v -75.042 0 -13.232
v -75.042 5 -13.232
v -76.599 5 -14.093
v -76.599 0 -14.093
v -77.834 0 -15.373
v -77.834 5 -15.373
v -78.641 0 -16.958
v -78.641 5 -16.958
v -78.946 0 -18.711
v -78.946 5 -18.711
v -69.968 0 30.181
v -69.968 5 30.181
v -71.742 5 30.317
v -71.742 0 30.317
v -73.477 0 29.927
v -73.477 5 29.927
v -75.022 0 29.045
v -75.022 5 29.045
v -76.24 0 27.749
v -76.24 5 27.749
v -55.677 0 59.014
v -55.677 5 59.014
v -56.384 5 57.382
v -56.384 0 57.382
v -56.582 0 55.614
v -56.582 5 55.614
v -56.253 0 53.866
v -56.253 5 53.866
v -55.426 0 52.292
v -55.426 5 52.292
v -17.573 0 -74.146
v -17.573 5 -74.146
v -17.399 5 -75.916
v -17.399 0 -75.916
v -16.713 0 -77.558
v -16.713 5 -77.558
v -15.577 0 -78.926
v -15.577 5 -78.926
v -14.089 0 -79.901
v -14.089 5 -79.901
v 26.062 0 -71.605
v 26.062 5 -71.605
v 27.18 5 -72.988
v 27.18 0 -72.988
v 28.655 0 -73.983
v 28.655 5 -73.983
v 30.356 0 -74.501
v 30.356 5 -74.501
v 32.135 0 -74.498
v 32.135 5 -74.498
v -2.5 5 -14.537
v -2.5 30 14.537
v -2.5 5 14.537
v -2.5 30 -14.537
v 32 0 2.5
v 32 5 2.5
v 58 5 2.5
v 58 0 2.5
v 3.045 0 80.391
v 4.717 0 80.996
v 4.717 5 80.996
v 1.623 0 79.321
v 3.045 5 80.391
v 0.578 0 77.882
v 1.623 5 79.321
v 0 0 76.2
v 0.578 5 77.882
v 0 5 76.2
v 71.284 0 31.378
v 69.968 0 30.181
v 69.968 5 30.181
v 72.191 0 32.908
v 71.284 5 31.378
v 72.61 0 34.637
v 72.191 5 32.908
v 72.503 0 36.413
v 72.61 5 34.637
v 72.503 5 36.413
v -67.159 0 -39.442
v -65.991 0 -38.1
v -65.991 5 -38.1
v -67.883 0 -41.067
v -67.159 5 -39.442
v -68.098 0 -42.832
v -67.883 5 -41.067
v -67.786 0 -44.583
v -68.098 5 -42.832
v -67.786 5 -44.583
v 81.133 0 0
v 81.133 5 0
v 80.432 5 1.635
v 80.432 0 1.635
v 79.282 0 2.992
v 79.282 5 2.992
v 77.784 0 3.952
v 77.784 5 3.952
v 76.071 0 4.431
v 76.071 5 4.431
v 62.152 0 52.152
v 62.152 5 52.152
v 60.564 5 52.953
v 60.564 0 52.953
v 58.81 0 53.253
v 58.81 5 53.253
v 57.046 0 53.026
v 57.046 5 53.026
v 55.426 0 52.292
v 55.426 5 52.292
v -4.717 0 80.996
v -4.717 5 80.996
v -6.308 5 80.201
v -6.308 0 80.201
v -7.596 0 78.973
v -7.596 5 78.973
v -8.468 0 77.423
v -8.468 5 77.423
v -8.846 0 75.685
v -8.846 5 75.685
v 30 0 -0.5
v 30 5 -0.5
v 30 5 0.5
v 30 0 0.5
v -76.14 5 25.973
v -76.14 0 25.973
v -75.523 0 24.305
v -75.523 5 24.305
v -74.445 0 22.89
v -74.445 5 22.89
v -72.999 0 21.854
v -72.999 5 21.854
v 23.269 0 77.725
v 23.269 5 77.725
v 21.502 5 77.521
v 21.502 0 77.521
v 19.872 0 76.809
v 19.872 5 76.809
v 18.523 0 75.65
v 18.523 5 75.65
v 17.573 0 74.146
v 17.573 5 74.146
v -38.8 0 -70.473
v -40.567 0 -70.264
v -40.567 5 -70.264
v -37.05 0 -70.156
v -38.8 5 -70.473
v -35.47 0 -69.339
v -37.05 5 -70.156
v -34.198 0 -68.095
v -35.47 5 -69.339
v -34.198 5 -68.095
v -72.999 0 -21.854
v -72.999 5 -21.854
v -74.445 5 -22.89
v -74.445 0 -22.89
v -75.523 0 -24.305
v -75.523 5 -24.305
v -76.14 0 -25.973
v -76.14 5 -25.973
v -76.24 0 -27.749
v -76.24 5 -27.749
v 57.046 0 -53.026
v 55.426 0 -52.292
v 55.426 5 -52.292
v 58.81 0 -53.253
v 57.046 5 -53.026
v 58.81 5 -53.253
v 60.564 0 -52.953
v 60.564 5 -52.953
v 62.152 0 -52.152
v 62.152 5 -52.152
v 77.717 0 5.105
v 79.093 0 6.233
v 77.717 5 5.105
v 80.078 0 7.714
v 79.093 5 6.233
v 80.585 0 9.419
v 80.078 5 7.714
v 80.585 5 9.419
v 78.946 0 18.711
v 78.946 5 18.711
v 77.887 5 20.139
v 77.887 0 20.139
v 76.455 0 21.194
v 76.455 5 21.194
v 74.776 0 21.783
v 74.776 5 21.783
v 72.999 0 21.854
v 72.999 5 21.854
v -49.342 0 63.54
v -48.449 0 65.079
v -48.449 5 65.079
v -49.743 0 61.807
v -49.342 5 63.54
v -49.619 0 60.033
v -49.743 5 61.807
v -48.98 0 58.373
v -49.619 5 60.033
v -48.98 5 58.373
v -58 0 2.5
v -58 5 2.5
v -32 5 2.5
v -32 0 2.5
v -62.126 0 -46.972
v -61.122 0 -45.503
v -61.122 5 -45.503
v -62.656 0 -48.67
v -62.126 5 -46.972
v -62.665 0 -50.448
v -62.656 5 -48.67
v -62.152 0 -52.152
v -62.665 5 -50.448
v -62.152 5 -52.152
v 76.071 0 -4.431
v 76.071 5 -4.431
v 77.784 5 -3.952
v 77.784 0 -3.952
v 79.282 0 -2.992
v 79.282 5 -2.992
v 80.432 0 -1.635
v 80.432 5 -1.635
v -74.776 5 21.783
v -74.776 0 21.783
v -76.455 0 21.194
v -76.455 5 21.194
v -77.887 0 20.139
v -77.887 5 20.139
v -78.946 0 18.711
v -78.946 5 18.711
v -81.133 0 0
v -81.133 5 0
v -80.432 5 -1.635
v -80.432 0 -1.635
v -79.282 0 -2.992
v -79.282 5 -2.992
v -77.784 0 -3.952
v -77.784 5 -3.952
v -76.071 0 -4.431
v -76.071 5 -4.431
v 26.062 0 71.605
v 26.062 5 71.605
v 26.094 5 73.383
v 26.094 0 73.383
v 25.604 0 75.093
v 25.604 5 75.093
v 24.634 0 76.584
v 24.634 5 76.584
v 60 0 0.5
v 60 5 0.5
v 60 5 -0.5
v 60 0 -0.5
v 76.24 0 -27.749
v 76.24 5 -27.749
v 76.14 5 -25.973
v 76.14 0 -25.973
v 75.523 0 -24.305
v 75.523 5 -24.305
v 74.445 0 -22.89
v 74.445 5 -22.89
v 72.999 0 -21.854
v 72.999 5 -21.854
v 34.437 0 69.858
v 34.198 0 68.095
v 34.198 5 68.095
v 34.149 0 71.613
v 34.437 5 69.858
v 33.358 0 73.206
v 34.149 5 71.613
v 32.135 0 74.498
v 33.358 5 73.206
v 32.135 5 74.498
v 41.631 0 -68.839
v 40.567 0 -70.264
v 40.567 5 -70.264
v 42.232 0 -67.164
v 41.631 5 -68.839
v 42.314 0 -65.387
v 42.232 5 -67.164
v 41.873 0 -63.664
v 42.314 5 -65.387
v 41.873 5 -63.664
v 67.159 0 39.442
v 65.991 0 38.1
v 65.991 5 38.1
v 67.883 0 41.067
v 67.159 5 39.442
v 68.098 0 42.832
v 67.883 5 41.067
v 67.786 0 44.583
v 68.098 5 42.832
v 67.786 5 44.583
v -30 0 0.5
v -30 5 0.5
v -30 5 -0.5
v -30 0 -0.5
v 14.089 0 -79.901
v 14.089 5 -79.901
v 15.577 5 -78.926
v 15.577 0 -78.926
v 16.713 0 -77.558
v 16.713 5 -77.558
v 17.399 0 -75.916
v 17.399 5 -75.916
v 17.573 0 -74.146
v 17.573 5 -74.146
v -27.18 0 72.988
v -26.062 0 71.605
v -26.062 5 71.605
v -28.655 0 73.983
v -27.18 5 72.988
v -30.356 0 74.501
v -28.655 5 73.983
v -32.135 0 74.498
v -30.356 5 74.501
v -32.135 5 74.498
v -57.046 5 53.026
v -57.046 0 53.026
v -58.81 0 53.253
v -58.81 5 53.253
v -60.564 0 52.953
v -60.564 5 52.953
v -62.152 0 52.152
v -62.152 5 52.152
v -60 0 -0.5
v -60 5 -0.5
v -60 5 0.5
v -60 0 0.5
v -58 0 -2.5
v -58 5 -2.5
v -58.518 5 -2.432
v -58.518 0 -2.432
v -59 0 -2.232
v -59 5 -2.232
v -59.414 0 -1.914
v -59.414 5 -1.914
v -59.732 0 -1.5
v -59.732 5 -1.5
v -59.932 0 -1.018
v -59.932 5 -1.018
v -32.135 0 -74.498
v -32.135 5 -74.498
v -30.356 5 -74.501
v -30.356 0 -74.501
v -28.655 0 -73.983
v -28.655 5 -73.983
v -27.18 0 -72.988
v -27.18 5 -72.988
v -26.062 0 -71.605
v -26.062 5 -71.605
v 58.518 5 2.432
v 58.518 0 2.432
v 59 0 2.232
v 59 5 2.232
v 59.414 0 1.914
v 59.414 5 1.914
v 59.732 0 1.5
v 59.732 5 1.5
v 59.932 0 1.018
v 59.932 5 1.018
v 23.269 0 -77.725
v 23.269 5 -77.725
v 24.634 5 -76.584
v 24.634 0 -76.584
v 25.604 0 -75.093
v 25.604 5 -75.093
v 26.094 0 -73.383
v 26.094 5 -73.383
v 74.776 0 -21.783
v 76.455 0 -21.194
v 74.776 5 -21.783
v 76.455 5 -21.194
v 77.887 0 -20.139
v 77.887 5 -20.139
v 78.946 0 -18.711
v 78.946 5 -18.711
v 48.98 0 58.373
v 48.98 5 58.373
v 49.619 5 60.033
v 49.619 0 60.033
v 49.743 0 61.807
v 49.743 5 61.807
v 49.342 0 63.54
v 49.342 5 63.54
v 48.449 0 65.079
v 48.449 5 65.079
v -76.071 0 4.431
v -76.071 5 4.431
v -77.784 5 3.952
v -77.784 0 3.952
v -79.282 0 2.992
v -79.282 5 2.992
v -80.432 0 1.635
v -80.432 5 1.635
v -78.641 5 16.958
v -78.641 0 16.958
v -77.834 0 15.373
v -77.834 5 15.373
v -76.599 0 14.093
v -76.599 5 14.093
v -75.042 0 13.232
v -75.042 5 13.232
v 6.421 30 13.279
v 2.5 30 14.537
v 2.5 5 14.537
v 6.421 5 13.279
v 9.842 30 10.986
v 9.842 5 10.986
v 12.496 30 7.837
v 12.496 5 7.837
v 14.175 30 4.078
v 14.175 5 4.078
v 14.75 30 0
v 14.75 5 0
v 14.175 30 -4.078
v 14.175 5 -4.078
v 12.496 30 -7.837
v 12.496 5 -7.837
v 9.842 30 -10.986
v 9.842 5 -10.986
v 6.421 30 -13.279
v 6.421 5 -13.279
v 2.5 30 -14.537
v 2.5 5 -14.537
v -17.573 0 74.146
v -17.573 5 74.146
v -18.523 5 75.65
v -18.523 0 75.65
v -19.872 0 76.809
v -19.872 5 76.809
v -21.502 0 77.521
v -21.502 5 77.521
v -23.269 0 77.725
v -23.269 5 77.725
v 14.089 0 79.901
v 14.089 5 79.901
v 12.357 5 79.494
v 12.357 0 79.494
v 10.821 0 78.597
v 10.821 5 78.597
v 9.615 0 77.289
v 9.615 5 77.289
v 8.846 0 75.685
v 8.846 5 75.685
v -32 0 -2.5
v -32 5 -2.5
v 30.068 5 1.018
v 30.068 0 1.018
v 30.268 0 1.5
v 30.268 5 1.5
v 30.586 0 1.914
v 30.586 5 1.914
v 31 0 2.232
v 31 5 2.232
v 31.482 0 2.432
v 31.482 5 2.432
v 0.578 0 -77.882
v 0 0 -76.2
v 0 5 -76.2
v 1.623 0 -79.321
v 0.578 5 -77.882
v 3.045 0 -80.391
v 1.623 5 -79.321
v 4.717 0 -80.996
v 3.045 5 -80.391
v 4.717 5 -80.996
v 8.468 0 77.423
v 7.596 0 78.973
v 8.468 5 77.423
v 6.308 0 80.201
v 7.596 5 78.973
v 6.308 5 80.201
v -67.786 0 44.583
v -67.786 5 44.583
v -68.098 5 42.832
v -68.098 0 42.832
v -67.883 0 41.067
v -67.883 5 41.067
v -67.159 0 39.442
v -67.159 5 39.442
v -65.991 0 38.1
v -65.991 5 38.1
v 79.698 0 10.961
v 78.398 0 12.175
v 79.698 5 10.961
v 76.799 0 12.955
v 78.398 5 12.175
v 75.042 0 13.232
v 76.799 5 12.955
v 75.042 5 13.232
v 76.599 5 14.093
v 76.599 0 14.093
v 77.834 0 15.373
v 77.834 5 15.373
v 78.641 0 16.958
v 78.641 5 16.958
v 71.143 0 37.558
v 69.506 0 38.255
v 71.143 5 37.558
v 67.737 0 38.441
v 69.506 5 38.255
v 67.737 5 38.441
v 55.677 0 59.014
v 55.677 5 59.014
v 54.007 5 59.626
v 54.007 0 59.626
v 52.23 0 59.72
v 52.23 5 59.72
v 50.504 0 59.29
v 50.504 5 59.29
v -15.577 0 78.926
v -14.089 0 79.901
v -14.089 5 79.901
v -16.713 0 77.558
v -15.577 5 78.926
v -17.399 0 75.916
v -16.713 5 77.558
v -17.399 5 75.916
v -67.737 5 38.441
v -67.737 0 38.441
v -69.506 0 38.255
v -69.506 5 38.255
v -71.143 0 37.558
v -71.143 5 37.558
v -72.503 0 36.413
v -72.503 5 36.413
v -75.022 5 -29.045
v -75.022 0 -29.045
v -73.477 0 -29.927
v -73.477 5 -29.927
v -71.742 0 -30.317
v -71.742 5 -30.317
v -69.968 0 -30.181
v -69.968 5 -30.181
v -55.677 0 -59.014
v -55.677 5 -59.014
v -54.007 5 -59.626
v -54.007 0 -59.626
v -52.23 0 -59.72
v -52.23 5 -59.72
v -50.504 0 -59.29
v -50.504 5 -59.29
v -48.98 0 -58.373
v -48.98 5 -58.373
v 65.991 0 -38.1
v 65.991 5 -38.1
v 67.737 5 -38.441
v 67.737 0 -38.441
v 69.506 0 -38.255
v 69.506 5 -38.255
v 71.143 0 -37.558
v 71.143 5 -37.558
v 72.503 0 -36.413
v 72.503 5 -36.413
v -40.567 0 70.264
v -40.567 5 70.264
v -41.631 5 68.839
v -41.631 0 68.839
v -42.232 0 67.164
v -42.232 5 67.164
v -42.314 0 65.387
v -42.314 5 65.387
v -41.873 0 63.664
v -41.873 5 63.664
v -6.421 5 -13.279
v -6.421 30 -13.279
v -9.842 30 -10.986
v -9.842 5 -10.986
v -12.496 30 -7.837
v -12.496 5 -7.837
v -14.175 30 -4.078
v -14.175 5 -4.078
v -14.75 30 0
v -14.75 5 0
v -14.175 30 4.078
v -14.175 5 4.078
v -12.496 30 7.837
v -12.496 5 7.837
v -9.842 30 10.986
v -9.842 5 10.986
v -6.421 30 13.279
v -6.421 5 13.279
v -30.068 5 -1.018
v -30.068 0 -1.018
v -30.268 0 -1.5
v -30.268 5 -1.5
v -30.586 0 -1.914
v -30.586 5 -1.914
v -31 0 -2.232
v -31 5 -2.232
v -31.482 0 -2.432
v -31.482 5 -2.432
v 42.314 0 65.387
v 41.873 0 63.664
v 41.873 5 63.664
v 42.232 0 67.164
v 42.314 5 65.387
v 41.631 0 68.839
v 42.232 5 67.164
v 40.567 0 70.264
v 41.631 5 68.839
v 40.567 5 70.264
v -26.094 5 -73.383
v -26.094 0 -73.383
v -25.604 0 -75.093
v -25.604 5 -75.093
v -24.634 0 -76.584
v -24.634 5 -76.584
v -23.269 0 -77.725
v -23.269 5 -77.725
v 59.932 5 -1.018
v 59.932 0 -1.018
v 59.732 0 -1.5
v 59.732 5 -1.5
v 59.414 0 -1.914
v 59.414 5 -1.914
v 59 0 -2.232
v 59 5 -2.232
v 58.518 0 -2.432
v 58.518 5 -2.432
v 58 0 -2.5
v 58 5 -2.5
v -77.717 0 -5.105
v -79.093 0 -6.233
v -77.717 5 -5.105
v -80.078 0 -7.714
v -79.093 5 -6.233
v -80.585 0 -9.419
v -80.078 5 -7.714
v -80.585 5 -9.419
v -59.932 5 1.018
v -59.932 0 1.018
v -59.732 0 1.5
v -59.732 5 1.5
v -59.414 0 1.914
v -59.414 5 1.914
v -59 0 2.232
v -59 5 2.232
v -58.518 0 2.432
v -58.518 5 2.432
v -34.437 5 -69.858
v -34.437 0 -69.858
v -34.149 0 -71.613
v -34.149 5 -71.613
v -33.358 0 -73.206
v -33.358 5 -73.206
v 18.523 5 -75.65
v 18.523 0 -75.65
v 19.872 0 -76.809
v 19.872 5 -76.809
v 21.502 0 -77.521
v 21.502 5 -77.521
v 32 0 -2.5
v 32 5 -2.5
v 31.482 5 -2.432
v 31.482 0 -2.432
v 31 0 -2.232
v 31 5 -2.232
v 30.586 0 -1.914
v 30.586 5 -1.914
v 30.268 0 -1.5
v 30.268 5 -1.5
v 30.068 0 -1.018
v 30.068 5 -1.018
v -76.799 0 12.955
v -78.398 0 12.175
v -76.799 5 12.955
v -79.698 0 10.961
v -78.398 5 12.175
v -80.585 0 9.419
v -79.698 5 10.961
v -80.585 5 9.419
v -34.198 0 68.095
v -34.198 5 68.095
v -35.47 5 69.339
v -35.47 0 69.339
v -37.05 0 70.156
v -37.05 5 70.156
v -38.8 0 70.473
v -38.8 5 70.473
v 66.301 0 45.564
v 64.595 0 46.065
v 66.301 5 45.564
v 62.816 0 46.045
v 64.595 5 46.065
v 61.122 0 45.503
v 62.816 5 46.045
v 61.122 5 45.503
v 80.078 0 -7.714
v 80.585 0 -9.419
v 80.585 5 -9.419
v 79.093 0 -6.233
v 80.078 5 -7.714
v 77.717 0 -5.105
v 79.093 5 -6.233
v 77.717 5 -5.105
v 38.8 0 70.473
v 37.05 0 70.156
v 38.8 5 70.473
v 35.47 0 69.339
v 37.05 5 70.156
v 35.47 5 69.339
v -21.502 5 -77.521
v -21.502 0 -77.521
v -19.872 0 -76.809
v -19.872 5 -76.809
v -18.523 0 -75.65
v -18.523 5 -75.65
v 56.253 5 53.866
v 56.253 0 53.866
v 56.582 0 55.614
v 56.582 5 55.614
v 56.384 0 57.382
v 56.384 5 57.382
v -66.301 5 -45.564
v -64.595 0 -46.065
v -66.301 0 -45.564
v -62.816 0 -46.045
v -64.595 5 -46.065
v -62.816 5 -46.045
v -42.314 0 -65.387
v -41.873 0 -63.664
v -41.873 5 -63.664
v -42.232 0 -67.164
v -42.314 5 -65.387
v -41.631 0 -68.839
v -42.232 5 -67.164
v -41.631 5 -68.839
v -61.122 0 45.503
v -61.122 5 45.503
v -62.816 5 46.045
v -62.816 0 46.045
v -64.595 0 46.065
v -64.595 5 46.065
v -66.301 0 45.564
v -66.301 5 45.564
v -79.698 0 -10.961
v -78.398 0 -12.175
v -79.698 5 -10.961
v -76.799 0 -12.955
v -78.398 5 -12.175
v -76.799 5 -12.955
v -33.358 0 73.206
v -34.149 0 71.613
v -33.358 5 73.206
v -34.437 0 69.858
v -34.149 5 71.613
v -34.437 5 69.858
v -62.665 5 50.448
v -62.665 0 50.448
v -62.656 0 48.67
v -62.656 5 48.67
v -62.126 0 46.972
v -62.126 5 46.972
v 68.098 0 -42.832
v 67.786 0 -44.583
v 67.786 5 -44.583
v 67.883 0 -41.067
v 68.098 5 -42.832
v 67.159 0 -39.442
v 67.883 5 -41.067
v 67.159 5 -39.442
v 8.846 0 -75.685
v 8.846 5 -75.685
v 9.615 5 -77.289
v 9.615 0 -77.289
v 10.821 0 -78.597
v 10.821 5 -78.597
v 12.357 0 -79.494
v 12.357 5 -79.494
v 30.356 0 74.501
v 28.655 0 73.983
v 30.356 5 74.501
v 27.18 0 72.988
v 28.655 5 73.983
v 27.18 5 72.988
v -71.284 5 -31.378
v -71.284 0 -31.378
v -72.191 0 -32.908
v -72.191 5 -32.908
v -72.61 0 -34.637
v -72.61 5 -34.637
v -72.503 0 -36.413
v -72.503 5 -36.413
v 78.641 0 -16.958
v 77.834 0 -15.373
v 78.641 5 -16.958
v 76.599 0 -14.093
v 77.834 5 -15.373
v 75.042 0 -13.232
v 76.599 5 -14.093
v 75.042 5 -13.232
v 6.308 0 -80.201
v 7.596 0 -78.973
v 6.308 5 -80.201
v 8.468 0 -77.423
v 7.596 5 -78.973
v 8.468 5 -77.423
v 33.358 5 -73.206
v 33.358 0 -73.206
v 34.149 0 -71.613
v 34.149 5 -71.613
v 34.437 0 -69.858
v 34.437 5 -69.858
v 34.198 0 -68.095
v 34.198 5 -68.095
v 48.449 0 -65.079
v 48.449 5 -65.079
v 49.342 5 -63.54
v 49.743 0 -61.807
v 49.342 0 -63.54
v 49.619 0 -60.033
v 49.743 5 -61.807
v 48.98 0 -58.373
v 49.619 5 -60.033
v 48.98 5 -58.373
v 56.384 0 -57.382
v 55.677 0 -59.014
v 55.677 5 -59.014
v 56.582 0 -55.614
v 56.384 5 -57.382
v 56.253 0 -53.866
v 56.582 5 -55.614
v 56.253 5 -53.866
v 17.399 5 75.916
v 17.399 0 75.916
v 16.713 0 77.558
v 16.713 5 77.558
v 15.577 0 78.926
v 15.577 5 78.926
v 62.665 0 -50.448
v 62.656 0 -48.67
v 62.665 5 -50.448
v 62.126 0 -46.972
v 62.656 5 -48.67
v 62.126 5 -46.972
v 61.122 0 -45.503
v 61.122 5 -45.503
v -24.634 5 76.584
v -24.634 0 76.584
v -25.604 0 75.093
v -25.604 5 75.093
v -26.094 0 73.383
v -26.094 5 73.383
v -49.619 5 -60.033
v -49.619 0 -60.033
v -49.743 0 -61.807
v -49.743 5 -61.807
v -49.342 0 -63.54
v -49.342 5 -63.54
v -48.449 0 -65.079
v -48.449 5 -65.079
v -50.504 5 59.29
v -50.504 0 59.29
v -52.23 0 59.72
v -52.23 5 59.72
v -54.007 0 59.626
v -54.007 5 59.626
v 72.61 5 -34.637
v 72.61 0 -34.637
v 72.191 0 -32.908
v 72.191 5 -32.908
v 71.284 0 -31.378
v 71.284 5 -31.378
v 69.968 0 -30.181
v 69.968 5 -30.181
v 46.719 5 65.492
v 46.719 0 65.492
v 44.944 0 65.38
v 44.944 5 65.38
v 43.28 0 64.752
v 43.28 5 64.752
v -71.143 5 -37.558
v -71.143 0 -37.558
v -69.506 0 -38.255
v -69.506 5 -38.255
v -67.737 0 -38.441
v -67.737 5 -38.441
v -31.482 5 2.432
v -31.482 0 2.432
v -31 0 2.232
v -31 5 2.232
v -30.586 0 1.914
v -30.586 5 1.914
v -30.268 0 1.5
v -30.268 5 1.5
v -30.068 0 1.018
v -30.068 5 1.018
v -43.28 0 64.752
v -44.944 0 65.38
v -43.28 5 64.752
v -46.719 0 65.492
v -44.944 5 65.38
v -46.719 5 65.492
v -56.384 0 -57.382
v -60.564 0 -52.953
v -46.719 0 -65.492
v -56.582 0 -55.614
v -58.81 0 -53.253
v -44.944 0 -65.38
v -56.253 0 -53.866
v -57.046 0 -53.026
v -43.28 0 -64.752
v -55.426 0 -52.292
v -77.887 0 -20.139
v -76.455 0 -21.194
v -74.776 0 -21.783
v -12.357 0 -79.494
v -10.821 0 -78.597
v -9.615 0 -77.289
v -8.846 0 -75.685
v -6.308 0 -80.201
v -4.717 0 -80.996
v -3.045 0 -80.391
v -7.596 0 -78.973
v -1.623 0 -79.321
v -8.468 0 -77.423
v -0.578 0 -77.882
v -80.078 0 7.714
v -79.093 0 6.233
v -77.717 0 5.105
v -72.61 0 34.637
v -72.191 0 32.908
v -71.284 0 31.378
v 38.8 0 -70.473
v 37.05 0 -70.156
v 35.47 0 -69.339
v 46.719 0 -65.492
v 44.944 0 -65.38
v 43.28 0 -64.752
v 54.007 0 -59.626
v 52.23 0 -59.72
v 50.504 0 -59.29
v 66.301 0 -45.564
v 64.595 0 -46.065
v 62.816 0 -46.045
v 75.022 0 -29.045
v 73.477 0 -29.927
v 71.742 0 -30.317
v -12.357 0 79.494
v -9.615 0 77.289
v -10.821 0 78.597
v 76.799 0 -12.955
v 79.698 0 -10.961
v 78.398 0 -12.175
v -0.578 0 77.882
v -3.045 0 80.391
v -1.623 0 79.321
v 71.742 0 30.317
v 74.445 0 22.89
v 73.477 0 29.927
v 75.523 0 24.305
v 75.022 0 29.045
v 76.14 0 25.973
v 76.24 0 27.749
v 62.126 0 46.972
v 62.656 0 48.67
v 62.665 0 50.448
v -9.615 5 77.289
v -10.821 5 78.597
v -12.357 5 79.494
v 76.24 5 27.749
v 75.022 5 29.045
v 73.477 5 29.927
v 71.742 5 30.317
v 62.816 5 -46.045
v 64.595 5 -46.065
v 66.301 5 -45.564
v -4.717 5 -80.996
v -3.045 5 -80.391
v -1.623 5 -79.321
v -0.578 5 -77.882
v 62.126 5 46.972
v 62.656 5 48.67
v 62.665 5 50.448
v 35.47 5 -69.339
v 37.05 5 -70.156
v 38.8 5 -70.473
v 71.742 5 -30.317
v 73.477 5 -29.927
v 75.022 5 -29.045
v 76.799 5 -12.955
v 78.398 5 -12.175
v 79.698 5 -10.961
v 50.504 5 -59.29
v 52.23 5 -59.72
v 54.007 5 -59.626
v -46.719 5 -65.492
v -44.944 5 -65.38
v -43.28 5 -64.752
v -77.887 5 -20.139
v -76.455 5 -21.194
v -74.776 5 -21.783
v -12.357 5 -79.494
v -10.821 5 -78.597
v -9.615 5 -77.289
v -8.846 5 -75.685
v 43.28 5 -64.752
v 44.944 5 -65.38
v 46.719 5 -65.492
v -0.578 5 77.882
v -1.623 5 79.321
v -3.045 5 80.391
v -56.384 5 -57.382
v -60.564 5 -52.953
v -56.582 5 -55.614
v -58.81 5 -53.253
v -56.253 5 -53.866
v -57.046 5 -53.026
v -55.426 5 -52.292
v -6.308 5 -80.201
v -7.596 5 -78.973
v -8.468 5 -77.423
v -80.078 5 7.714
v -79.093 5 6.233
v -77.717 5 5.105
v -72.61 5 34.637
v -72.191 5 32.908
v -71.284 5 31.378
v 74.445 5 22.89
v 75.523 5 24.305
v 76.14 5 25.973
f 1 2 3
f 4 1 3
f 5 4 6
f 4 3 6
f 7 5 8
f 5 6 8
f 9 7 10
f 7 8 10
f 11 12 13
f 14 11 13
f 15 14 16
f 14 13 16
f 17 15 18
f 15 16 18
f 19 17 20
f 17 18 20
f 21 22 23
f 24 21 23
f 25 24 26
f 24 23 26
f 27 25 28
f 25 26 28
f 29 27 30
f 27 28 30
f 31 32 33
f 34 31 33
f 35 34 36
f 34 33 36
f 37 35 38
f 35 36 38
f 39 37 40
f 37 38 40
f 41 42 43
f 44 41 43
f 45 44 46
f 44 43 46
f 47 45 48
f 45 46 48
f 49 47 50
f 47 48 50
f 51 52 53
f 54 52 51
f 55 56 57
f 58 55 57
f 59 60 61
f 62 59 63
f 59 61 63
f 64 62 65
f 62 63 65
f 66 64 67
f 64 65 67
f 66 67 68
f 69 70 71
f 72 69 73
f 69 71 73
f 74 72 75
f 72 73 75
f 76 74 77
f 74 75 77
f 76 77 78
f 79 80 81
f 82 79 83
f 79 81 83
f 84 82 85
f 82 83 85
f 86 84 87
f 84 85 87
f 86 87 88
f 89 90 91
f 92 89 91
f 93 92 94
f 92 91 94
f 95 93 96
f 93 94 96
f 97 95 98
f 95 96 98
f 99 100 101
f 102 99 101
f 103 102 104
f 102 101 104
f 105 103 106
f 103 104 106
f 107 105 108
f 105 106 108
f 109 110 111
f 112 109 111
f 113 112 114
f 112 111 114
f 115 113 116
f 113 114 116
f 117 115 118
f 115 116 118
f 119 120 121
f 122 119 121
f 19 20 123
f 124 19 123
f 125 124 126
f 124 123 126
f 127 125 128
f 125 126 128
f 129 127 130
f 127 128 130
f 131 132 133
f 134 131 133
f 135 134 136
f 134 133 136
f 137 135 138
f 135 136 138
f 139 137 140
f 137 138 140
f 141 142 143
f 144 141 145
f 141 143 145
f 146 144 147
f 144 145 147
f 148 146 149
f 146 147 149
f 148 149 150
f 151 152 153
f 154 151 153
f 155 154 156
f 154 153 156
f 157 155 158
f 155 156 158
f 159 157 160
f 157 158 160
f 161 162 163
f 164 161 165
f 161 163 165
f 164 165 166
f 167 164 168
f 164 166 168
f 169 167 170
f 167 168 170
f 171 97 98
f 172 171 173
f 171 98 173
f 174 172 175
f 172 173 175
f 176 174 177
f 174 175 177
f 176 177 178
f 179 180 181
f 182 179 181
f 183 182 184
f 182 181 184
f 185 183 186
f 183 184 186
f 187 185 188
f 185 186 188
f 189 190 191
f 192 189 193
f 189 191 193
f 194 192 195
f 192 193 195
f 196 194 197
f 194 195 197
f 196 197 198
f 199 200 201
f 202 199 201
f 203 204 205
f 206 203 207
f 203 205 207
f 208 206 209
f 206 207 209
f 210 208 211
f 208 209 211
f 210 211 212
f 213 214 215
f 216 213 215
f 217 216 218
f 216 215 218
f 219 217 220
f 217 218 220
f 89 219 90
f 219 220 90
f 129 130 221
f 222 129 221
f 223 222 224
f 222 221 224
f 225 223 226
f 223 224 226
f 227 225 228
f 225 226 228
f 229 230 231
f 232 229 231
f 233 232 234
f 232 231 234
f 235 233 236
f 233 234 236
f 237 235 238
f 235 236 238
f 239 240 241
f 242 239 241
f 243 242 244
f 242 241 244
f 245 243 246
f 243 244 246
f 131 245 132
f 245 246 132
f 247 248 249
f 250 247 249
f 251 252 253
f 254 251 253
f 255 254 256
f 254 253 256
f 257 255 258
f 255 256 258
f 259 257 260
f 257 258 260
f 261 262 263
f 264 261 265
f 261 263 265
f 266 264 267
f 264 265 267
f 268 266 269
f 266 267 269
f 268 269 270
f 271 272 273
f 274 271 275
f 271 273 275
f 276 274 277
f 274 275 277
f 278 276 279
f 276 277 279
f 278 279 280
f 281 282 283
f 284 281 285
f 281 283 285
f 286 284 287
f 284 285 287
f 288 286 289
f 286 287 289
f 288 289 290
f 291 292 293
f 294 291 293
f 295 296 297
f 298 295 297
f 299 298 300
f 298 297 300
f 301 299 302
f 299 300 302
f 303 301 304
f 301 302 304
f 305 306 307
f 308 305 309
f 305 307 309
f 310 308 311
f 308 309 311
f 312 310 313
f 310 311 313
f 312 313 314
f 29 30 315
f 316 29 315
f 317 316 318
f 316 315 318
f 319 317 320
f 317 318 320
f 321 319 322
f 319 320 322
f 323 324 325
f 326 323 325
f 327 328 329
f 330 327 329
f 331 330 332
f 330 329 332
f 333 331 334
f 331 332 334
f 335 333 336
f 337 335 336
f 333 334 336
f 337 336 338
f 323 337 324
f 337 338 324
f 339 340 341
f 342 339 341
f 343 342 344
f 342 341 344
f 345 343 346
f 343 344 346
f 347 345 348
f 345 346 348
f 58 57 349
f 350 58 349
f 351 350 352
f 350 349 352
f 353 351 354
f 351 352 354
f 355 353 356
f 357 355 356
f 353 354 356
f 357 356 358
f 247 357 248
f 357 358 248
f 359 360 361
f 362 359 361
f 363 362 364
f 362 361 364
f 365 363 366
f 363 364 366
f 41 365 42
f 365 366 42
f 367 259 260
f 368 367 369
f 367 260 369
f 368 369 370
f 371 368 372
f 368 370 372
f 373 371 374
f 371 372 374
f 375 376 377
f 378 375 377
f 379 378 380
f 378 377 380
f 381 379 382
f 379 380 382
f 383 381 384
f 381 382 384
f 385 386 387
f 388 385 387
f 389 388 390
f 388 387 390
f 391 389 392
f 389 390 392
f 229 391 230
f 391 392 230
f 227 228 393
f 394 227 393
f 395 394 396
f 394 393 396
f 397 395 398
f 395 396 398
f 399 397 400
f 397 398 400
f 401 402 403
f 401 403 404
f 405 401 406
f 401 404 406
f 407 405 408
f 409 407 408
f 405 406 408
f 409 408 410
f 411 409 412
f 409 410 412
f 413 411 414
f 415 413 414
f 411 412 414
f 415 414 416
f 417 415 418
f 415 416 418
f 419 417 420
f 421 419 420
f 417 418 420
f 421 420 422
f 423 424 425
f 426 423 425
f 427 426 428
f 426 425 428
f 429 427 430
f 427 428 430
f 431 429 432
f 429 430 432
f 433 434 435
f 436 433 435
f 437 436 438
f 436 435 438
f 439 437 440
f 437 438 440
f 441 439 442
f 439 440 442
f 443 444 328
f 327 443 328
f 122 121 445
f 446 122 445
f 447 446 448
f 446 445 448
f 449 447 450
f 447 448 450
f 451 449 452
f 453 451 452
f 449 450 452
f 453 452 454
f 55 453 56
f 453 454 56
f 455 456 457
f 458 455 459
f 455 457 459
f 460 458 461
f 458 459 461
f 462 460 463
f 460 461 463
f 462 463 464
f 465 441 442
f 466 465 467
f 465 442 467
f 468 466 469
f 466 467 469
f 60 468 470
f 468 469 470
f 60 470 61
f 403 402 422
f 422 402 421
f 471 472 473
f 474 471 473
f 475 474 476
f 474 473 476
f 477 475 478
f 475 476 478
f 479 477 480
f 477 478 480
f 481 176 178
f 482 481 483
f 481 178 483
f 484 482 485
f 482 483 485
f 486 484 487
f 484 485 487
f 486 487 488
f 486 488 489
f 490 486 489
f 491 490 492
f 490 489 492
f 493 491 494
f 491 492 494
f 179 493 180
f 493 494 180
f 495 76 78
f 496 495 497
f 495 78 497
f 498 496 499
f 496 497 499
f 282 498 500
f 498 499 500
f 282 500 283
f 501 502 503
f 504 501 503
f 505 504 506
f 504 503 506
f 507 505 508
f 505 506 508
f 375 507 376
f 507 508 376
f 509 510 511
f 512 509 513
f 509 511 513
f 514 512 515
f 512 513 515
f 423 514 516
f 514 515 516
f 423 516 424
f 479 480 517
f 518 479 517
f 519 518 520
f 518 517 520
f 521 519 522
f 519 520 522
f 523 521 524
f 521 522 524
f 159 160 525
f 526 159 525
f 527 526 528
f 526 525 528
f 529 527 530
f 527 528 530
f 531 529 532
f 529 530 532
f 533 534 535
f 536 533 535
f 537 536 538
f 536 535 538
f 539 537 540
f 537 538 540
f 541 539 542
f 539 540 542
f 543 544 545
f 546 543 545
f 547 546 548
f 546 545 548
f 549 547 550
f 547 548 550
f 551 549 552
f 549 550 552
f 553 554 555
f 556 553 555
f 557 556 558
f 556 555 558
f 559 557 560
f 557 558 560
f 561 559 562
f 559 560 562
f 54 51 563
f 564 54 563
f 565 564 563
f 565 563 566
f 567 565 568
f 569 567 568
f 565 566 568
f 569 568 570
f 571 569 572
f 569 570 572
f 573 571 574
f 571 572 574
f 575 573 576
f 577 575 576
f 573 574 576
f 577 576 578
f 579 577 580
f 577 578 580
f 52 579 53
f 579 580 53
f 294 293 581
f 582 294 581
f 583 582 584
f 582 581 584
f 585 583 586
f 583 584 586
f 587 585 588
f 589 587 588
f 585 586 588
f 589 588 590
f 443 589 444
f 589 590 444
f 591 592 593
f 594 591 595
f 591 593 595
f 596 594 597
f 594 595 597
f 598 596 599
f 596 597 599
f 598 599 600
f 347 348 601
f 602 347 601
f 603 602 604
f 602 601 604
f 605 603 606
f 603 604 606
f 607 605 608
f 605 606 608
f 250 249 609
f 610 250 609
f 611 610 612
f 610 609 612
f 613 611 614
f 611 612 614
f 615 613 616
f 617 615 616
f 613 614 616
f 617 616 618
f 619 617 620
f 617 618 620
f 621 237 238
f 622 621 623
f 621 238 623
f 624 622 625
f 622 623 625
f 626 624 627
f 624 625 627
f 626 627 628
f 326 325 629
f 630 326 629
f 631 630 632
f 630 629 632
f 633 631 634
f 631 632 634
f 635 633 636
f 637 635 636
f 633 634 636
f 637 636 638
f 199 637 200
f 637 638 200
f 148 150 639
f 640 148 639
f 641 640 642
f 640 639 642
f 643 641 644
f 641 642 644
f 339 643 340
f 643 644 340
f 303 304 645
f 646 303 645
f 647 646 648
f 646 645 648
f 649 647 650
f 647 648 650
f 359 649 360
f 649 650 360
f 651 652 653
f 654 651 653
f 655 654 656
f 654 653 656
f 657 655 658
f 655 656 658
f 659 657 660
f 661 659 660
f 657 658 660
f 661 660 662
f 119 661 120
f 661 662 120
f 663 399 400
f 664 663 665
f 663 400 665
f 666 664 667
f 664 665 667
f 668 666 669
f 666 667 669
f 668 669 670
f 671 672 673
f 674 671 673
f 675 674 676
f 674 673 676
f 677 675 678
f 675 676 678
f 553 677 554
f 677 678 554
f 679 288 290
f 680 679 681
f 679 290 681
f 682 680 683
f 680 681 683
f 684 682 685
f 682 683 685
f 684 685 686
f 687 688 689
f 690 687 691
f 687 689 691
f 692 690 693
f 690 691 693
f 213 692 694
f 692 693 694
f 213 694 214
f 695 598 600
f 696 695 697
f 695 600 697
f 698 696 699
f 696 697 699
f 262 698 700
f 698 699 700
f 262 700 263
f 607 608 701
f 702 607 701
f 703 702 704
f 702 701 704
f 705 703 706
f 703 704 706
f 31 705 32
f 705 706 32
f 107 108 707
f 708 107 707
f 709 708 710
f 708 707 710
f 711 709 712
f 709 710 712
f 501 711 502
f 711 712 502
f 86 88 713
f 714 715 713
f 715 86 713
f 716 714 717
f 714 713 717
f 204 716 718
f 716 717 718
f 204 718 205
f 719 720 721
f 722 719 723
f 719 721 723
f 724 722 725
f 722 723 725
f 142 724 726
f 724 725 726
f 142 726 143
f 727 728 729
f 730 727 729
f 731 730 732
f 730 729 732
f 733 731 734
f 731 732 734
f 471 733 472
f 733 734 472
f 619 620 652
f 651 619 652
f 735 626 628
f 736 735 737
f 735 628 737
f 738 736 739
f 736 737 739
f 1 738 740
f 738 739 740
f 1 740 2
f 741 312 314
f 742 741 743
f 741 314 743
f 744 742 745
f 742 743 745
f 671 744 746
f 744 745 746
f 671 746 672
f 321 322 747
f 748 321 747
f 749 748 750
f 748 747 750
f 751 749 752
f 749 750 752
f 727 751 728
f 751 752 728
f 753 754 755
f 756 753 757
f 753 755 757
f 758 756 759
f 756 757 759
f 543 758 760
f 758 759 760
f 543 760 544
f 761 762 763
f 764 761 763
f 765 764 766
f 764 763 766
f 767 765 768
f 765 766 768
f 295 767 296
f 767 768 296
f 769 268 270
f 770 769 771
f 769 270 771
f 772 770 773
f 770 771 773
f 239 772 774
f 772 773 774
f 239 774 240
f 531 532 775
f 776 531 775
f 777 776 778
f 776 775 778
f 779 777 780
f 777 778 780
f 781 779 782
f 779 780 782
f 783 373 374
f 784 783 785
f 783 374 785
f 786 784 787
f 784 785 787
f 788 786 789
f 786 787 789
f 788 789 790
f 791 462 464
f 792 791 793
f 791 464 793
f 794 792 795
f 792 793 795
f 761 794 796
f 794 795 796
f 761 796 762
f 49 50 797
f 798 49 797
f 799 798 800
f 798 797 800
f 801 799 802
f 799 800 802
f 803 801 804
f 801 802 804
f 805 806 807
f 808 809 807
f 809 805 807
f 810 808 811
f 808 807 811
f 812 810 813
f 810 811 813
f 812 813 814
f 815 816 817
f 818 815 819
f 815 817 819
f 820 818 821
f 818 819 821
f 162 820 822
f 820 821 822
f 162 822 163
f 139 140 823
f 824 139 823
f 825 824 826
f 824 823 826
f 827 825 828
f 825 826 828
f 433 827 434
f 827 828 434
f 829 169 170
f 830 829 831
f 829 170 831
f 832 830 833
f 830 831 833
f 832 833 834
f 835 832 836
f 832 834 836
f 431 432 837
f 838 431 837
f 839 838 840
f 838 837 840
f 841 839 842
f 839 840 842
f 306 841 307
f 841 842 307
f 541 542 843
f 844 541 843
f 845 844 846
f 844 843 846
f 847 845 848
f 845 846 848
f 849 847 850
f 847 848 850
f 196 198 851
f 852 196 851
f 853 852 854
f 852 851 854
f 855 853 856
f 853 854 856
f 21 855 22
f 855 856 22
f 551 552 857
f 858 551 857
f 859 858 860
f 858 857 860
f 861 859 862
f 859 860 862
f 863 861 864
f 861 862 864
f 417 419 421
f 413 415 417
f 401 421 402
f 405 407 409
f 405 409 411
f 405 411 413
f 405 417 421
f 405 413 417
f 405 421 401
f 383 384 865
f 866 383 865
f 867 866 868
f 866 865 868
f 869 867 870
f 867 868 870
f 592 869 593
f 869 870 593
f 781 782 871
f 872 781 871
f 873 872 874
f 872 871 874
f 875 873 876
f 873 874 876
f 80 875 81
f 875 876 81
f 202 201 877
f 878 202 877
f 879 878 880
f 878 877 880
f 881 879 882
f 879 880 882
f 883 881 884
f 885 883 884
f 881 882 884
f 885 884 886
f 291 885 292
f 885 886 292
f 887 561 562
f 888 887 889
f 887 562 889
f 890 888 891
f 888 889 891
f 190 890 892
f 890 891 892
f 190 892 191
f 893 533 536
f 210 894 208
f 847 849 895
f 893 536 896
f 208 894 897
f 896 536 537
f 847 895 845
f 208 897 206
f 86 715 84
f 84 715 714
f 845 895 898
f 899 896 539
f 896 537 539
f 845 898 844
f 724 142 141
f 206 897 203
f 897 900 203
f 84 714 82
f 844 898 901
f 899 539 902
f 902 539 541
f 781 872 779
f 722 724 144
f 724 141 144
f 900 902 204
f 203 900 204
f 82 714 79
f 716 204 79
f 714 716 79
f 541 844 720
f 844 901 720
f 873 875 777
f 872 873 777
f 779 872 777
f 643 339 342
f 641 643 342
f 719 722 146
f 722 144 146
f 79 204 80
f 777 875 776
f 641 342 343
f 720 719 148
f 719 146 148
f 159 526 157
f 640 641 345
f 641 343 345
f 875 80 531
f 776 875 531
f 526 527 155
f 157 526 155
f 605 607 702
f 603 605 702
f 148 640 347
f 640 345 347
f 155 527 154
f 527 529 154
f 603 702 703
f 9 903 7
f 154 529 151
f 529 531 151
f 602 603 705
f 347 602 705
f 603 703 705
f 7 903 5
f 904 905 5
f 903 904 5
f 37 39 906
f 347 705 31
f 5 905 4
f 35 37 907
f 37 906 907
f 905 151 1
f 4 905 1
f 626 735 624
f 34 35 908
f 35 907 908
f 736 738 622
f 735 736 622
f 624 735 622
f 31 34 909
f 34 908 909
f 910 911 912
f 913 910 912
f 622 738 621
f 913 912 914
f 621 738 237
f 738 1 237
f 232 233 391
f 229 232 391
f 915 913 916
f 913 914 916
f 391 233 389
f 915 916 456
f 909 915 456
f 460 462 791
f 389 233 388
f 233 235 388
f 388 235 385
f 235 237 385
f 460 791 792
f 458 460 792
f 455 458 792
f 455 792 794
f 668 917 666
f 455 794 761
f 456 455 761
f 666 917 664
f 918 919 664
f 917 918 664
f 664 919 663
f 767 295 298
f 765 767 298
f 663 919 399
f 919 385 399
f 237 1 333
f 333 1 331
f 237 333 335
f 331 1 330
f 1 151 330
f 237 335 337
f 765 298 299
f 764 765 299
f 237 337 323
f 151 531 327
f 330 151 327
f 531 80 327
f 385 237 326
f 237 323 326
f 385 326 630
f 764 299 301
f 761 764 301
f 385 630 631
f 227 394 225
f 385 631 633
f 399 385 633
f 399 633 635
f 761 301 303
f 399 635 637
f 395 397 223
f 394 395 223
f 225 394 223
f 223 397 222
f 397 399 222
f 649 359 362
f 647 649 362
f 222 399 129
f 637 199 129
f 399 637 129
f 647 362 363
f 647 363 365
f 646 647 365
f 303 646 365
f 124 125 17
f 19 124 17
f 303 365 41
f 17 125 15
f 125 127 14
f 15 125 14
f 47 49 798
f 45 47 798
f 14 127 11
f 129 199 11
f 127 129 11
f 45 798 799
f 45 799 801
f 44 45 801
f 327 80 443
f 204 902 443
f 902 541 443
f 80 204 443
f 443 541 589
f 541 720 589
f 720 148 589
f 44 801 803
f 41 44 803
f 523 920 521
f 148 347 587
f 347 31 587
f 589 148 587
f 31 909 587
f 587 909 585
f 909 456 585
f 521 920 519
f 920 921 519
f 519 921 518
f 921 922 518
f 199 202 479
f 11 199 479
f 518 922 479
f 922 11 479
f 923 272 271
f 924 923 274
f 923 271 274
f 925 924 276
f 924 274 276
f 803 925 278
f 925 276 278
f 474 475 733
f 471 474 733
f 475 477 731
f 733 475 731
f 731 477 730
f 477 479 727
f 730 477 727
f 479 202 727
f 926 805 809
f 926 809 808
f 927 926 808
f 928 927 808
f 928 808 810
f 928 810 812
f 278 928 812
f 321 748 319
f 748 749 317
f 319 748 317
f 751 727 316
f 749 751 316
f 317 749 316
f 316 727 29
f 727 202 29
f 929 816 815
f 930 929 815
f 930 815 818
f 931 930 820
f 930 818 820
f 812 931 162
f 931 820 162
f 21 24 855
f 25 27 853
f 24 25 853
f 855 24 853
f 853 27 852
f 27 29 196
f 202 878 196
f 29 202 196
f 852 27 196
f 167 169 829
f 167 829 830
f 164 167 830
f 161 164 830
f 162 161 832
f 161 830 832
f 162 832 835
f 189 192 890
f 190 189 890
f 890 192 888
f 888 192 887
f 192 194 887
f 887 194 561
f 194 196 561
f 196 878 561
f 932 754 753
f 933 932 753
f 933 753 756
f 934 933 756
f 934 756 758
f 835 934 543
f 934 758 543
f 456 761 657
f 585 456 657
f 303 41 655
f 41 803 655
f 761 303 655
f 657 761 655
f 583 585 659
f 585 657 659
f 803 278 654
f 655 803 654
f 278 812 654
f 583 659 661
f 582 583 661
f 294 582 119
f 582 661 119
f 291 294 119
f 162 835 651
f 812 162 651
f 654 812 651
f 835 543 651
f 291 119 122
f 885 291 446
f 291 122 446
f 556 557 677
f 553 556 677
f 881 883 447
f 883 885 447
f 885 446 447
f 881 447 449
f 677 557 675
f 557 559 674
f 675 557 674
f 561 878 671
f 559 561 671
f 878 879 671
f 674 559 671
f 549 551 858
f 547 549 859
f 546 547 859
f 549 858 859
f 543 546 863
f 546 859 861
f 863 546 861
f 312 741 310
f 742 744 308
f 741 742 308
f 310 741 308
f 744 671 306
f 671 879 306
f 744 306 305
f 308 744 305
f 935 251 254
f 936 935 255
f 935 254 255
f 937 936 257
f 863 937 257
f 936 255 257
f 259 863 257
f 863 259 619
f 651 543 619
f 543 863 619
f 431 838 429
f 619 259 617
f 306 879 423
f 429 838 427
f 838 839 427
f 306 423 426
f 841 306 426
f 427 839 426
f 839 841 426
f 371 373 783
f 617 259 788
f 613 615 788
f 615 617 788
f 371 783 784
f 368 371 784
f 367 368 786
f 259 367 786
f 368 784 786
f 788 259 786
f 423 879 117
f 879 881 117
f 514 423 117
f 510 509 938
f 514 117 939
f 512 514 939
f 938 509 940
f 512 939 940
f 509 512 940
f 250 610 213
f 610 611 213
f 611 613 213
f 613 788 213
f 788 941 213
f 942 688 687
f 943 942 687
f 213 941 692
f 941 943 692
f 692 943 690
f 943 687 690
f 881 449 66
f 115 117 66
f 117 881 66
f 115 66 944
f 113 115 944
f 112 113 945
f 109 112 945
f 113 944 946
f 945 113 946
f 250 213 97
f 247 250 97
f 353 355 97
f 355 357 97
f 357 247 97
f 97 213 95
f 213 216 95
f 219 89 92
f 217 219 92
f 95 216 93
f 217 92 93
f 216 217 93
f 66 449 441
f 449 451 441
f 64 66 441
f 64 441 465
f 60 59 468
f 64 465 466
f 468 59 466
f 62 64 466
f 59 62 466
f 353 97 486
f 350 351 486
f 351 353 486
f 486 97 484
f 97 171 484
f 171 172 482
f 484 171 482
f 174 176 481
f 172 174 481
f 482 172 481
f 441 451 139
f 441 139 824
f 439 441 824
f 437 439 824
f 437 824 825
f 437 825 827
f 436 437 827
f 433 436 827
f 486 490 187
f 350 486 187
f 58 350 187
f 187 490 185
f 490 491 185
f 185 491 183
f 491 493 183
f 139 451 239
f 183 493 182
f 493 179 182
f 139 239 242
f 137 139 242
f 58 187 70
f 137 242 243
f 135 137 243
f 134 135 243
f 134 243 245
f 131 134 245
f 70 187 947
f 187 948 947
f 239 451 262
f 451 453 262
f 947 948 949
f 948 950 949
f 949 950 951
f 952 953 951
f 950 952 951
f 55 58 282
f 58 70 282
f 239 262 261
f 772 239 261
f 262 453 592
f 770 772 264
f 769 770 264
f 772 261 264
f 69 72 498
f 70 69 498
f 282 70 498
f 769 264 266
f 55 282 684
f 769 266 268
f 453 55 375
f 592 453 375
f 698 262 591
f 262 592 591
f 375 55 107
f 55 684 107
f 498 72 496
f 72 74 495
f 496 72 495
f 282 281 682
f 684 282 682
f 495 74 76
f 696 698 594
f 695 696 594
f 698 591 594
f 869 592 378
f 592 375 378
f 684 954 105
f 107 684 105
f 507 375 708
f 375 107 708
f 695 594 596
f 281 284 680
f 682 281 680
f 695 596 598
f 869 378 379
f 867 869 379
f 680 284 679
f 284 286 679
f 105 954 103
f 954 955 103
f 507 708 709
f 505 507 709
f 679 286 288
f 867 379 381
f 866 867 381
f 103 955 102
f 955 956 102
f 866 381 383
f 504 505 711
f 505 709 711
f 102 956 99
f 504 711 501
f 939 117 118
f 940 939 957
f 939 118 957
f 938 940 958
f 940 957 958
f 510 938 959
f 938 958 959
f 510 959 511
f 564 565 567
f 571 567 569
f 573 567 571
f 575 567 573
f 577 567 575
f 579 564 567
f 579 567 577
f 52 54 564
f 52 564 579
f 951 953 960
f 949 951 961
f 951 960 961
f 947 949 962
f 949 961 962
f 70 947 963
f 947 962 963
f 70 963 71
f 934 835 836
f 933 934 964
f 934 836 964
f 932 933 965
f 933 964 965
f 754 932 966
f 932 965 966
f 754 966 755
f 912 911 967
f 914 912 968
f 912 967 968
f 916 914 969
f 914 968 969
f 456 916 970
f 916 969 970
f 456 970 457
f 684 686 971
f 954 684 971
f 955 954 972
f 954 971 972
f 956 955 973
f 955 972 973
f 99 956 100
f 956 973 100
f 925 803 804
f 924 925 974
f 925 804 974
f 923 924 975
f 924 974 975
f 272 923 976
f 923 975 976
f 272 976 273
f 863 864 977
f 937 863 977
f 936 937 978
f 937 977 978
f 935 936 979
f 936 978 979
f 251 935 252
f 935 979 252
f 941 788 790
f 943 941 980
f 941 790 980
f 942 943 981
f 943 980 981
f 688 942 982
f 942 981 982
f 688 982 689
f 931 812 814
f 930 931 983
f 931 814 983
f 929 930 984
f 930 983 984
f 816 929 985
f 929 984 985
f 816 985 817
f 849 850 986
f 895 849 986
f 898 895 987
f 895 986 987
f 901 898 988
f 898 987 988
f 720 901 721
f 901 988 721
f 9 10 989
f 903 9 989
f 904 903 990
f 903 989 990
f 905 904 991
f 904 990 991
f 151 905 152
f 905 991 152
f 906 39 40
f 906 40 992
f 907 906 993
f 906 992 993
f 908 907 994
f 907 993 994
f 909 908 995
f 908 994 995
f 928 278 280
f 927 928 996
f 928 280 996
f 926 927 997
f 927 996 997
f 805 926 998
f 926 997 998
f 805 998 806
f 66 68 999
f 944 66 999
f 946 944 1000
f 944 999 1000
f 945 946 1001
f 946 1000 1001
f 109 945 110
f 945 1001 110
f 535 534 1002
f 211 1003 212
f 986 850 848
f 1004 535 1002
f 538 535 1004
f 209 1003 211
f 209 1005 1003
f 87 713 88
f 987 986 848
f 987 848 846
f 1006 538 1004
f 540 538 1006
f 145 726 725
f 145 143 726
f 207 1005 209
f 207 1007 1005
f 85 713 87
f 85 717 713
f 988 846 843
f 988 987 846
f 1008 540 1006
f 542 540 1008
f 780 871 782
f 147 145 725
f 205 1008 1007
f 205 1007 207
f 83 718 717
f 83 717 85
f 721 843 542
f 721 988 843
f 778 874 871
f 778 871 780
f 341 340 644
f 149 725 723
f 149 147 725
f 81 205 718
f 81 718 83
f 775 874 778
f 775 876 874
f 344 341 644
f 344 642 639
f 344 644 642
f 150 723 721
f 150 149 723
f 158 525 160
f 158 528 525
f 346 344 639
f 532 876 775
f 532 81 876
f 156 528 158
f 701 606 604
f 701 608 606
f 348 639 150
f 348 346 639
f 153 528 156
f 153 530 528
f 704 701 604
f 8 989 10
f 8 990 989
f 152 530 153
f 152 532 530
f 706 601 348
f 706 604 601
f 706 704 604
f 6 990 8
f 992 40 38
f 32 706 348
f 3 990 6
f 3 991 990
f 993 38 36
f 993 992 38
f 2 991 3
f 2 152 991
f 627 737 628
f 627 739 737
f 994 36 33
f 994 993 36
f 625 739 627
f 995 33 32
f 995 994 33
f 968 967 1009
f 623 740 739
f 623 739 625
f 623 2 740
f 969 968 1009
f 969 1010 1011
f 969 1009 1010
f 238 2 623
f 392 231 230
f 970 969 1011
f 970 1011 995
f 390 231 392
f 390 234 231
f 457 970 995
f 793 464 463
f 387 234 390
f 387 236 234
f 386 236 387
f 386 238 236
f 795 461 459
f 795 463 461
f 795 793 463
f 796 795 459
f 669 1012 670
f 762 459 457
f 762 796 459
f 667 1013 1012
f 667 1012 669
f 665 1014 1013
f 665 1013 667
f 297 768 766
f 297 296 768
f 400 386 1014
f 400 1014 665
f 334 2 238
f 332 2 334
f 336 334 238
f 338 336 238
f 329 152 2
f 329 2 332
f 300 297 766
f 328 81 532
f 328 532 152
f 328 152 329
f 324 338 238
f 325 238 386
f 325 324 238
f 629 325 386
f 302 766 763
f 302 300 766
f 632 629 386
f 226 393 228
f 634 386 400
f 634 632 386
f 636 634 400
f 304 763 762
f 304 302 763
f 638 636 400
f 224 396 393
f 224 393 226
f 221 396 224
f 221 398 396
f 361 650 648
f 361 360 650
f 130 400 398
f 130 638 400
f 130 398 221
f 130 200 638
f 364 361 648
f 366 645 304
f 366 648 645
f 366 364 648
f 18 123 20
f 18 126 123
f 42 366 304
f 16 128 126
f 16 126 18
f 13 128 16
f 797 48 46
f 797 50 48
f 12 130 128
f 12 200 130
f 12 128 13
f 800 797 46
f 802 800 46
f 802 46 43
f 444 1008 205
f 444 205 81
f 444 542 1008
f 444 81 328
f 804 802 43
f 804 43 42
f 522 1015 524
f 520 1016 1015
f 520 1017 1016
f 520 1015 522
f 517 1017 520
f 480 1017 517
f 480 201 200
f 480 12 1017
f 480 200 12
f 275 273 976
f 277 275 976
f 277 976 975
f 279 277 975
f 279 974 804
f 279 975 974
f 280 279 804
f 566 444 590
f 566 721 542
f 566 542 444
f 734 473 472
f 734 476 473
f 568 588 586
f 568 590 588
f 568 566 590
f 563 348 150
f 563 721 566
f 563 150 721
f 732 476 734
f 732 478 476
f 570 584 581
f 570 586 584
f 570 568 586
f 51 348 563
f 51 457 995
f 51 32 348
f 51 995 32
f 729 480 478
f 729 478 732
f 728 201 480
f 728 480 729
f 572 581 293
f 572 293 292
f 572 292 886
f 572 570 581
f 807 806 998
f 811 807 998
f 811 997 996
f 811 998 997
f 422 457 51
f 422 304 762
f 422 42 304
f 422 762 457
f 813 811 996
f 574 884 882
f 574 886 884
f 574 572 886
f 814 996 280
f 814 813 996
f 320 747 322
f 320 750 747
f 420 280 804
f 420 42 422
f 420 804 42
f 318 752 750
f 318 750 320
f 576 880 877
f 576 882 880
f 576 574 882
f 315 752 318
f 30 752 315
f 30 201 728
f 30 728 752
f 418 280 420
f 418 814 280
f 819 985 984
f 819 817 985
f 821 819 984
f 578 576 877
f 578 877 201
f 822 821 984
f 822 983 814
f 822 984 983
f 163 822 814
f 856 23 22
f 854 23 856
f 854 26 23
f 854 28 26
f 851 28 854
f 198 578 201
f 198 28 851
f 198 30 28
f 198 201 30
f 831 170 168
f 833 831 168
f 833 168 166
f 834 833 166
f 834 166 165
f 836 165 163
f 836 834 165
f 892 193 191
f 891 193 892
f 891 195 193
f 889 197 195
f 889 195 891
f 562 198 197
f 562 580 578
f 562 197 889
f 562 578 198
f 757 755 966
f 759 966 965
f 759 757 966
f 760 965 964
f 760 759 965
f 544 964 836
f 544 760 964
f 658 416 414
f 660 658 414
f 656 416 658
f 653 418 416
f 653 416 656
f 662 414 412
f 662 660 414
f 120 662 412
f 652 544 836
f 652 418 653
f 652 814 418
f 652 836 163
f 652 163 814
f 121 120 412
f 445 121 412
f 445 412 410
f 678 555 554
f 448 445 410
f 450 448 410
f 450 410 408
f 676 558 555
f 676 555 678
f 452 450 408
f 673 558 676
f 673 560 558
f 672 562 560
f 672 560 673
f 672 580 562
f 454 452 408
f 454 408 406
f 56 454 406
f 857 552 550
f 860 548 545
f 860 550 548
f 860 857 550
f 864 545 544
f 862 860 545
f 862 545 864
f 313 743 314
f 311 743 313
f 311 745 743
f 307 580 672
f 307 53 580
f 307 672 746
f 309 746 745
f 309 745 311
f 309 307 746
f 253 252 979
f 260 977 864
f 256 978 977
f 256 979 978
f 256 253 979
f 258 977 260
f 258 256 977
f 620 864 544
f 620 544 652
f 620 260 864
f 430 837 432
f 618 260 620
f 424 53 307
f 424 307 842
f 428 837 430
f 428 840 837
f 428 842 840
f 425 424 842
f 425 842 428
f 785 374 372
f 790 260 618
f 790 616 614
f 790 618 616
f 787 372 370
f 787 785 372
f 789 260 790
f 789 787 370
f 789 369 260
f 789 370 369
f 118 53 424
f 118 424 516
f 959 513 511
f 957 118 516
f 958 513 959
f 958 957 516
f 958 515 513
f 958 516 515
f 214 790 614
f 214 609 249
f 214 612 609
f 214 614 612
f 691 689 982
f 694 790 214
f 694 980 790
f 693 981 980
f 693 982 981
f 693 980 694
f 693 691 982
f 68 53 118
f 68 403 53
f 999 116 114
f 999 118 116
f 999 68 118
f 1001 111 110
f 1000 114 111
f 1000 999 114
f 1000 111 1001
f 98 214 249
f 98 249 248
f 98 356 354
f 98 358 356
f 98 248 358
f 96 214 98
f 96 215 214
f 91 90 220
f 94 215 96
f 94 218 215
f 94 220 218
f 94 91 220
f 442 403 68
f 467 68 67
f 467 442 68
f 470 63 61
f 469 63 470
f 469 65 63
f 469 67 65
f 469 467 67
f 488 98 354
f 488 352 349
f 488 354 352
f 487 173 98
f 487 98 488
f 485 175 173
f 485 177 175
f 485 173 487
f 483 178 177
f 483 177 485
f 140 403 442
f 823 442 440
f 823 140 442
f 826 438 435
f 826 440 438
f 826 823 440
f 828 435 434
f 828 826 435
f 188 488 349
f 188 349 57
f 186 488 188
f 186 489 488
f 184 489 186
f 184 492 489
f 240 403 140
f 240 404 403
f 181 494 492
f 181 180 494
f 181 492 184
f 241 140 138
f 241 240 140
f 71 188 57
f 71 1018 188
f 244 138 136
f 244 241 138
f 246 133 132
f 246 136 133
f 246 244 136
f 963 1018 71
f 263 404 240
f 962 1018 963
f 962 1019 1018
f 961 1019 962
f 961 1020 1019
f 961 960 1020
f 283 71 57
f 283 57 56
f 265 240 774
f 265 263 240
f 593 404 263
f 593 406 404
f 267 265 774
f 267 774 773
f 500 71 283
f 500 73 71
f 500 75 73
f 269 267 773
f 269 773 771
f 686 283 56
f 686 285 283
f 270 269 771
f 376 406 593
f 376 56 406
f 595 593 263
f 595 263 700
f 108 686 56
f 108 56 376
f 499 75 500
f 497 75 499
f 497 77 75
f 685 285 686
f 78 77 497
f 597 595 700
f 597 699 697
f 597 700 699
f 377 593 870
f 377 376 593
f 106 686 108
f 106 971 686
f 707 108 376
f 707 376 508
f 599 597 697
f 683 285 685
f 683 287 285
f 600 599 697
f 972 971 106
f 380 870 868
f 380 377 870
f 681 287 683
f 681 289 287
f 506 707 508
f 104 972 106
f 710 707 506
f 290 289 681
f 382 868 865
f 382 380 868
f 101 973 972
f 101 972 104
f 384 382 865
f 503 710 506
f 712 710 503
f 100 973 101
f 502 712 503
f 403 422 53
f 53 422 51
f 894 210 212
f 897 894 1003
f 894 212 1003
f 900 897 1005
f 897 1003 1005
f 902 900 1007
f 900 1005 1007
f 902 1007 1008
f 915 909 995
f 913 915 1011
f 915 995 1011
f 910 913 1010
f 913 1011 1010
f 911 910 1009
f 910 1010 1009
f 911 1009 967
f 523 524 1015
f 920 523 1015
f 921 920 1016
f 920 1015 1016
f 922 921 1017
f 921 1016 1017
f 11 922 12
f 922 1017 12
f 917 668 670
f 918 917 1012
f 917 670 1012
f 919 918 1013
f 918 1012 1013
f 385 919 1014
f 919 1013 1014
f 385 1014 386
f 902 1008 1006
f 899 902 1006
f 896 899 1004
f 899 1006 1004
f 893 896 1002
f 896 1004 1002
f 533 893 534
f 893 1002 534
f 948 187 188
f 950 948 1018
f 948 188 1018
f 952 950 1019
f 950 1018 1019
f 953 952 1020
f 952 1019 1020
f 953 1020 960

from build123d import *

# Parameters (mm, degrees)
SKETCH1_R           = 81.2
BOSS_EXTRUDE1_DEPTH = 5
SKETCH4_R           = 14.75
BOSS_EXTRUDE2_DEPTH = 25
CUT_EXTRUDE2_DEPTH  = 118.523955005
CIRPATTERN2_COUNT   = 54
CUT_EXTRUDE4_DEPTH  = 118.337042358
SKETCH5_W           = 5
SKETCH5_H           = 29.5
CUT_EXTRUDE3_DEPTH  = 25
LPATTERN1_COUNT     = 2
LPATTERN1_PITCH     = 90


with BuildPart() as part:
    # Sketch1 → Boss-Extrude1 (new body)
    with BuildSketch(Plane(origin=(0, 0, 0), x_dir=(1, 0, 0), z_dir=(0, 1, 0))):
        with Locations(Location((0, 0, 0), (0, 0, 270))):
            Circle(SKETCH1_R)
    extrude(amount=BOSS_EXTRUDE1_DEPTH)

    # Sketch4 → Boss-Extrude2 (add)
    with BuildSketch(Plane(origin=(0, 5, 0), x_dir=(1, 0, 0), z_dir=(0, 1, 0))):
        with Locations(Location((0, 0, 0), (0, 0, 270))):
            Circle(SKETCH4_R)
    extrude(amount=BOSS_EXTRUDE2_DEPTH)

    # Sketch2 → Cut-Extrude2 (cut, through all)
    with BuildSketch(Plane(origin=(0, 5, 0), x_dir=(1, 0, 0), z_dir=(0, 1, 0))):
        with BuildLine():
            ThreePointArc((5, 81.045912914), (0, 81.2), (-5, 81.045912914))
            ThreePointArc((-5, 81.045912914), (-1.725153292, 79.42244122), (0, 76.2))
            ThreePointArc((0, 76.2), (1.725153292, 79.42244122), (5, 81.045912914))
        make_face()
    cut_extrude2 = extrude(amount=-CUT_EXTRUDE2_DEPTH, mode=Mode.SUBTRACT)

    # CirPattern2: Cut-Extrude2 ×54 about axis
    cirpattern2_axis = Axis((0, 0, 0), (0, 1, 0))
    for i in range(1, CIRPATTERN2_COUNT):
        add(cut_extrude2.rotate(cirpattern2_axis, i * 360 / CIRPATTERN2_COUNT), mode=Mode.SUBTRACT)

    # Sketch6 → Cut-Extrude4 (cut, through all)
    with BuildSketch(Plane(origin=(0, 5, 0), x_dir=(1, 0, 0), z_dir=(0, 1, 0))):
        with BuildLine():
            Line((-58, -2.5), (-32, -2.5))
            ThreePointArc((-32, -2.5), (-30.585786438, -1.914213562), (-30, -0.5))
            Line((-30, -0.5), (-30, 0.5))
            ThreePointArc((-30, 0.5), (-30.585786438, 1.914213562), (-32, 2.5))
            Line((-32, 2.5), (-58, 2.5))
            ThreePointArc((-58, 2.5), (-59.414213562, 1.914213562), (-60, 0.5))
            Line((-60, 0.5), (-60, -0.5))
            ThreePointArc((-60, -0.5), (-59.414213562, -1.914213562), (-58, -2.5))
        make_face()
    cut_extrude4 = extrude(amount=-CUT_EXTRUDE4_DEPTH, mode=Mode.SUBTRACT)

    # Sketch5 → Cut-Extrude3 (cut)
    with BuildSketch(Plane(origin=(0, 30, 0), x_dir=(1, 0, 0), z_dir=(0, 1, 0))):
        Rectangle(SKETCH5_W, SKETCH5_H)
    extrude(amount=-CUT_EXTRUDE3_DEPTH, mode=Mode.SUBTRACT)

    # LPattern1: Cut-Extrude4 ×2
    with Locations(*[(i * LPATTERN1_PITCH, 0, 0) for i in range(1, LPATTERN1_COUNT)]):
        add(cut_extrude4, mode=Mode.SUBTRACT)


solid = part.part
